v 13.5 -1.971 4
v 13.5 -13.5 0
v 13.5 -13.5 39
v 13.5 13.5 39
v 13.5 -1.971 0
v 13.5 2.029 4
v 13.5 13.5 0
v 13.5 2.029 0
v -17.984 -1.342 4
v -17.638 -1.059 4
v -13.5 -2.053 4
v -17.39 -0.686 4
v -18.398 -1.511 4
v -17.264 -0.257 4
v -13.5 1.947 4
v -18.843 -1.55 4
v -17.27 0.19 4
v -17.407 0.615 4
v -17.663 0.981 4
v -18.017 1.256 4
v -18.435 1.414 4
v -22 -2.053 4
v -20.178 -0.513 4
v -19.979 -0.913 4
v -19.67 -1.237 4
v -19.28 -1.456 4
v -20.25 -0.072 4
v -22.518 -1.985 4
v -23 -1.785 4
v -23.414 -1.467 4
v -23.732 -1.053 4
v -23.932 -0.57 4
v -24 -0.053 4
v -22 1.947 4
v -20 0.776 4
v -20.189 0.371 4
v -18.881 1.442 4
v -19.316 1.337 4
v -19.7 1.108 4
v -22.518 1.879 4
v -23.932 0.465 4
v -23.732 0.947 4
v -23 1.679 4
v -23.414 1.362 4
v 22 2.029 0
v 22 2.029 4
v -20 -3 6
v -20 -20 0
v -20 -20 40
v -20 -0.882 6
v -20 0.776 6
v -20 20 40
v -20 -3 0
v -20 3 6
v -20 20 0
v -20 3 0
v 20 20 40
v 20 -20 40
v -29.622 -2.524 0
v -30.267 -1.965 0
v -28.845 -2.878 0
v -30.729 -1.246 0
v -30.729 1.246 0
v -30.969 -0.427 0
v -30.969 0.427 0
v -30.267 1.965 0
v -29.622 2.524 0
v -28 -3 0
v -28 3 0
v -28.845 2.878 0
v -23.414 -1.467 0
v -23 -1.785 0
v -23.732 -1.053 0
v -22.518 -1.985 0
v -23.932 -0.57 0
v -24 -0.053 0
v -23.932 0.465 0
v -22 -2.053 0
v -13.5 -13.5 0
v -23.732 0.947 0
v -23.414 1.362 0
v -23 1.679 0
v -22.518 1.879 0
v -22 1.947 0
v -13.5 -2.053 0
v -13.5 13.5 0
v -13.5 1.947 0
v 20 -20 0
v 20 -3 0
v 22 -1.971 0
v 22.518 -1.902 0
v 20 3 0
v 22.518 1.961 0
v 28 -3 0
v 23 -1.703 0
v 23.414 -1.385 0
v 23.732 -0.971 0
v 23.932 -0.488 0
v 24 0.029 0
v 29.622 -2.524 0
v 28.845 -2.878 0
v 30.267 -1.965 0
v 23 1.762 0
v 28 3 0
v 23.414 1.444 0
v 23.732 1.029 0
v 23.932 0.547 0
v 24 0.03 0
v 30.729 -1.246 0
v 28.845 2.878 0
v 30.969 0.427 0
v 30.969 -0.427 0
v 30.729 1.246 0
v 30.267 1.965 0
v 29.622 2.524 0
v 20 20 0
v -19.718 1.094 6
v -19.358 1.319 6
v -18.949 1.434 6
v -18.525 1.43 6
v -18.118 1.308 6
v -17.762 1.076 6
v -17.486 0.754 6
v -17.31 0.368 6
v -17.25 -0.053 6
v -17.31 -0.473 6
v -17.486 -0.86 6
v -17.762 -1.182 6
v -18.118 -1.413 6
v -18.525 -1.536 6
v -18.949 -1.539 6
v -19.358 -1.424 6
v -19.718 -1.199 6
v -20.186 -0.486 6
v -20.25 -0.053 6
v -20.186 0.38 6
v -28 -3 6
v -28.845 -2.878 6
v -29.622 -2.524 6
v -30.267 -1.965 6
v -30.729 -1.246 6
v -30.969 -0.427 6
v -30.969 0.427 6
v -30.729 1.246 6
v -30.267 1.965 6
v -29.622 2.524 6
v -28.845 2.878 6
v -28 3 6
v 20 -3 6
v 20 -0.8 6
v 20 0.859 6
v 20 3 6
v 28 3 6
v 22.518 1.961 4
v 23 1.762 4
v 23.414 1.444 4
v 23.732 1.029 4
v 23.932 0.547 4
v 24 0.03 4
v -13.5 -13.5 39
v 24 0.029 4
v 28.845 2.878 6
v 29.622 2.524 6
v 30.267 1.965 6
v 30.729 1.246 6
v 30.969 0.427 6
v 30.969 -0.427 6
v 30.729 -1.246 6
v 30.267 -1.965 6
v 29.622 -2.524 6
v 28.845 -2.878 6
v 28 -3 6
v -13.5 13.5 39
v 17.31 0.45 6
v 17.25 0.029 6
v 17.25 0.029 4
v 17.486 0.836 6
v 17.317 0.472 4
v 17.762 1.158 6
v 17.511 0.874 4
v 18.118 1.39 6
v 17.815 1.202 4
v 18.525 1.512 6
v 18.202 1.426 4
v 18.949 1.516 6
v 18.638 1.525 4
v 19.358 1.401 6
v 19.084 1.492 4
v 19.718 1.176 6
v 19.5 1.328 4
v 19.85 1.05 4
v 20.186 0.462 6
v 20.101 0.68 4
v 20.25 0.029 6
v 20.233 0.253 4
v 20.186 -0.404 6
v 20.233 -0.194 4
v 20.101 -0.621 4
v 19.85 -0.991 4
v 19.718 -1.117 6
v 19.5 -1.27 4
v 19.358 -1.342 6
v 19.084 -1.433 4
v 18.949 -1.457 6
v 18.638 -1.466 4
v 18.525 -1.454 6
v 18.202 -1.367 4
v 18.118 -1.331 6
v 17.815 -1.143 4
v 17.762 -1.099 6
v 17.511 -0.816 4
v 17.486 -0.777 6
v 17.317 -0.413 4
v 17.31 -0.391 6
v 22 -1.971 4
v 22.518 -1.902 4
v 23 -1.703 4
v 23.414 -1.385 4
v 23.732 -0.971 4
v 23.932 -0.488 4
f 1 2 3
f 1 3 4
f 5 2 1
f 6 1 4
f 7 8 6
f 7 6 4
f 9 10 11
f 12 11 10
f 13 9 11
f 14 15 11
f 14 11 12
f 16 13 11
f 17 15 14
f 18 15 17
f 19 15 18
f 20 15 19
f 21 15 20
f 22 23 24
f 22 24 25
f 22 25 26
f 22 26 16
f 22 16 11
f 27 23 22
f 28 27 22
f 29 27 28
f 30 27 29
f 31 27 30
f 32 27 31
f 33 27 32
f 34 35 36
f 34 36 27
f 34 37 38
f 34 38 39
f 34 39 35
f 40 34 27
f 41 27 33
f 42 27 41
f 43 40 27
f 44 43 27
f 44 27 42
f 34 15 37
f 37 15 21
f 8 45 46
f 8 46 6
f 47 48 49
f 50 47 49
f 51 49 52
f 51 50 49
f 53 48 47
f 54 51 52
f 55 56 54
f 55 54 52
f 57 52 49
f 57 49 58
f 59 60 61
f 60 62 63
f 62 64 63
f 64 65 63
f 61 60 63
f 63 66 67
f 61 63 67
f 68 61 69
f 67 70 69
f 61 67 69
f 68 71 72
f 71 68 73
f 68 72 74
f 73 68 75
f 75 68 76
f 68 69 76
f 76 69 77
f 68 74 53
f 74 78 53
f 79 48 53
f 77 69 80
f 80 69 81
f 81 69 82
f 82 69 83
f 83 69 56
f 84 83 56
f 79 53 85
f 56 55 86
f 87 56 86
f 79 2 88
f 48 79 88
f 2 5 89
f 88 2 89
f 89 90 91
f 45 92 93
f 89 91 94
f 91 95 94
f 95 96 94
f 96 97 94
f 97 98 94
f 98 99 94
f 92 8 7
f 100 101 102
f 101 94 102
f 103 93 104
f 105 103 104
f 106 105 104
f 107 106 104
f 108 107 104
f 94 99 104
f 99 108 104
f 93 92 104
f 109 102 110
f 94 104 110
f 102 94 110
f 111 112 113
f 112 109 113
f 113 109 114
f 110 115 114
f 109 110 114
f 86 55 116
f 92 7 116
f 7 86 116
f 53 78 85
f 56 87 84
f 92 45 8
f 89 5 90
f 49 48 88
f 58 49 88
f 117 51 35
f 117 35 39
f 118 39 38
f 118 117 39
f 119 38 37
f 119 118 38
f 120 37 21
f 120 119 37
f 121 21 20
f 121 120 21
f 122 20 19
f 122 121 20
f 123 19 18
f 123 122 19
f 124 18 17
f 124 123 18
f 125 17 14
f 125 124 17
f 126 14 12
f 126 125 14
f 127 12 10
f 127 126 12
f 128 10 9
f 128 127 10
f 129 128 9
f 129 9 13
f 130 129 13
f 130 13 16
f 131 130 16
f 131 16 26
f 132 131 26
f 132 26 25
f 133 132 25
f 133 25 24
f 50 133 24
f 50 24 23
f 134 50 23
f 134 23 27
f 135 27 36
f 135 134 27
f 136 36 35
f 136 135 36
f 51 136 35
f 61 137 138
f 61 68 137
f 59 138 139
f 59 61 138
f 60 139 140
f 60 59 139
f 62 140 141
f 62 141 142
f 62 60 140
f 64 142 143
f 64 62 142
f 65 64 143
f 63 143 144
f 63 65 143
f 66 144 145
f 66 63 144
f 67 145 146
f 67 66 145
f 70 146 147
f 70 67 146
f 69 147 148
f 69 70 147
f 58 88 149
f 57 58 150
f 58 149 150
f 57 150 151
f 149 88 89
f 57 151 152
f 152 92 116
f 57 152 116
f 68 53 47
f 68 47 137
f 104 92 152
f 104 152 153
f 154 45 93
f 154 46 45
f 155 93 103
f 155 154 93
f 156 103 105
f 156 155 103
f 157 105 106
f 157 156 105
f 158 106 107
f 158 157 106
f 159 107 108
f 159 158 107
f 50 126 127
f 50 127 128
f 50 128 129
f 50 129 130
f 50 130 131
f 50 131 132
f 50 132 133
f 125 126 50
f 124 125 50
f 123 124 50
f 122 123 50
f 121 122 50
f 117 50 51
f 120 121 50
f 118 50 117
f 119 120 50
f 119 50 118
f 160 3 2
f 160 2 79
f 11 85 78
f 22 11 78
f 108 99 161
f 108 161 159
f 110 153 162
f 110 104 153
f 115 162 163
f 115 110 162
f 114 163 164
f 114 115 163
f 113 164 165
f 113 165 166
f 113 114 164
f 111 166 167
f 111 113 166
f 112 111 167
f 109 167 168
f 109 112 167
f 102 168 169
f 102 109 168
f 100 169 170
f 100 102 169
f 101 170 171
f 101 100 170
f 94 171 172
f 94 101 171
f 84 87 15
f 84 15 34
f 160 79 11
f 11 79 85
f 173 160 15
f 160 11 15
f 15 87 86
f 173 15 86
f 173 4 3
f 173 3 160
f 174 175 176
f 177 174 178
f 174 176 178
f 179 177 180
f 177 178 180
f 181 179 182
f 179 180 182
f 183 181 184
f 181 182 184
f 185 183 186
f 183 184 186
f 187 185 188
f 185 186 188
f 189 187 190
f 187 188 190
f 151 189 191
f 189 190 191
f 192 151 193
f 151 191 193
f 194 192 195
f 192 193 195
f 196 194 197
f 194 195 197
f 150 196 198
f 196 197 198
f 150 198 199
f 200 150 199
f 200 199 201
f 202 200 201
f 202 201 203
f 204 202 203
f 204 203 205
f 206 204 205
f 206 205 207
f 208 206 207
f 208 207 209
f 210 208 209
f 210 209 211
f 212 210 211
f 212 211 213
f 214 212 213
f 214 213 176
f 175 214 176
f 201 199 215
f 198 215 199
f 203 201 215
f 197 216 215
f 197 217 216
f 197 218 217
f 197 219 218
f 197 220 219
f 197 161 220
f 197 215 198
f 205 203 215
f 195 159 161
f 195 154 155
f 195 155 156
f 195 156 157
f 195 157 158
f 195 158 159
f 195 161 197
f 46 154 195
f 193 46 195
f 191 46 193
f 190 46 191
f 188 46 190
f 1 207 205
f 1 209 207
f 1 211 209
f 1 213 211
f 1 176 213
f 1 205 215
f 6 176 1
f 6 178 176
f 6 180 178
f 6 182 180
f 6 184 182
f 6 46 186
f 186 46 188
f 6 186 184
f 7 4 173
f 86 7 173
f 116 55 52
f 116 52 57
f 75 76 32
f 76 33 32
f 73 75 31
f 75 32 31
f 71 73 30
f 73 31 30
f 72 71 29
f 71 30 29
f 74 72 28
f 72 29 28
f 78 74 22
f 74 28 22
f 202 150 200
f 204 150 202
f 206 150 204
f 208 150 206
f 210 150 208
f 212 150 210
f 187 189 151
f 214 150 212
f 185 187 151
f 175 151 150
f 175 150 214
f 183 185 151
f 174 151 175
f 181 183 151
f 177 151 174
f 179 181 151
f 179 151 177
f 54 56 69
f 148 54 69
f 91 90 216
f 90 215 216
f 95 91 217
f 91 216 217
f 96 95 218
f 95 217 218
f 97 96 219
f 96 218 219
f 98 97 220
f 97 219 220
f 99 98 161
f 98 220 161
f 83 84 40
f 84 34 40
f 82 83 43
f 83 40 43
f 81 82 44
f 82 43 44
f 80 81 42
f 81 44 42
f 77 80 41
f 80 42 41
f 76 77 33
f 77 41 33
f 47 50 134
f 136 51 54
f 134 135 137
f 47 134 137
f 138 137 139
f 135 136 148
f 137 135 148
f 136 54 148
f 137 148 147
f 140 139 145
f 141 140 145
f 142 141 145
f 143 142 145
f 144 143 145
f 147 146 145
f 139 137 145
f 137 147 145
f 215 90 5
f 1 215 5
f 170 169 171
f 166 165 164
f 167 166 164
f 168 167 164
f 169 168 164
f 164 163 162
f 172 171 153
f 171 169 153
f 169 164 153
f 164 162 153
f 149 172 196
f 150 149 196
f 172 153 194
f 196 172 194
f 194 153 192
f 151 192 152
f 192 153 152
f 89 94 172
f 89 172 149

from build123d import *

# Parameters (mm, degrees)
SKETCH1_W               = 40
SKETCH1_H               = 40
BOSS_EXTRUDE1_DEPTH     = 40
SKETCH2_W               = 27
SKETCH2_H               = 27
CUT_EXTRUDE1_DEPTH      = 39
SKETCH3_W               = 11
SKETCH3_H               = 6
BOSS_EXTRUDE3_DEPTH     = 6
SKETCH6_W               = 10.5
SKETCH6_H               = 4
CUT_EXTRUDE2_DEPTH      = 4
SKETCH7_W               = 10.5
SKETCH7_H               = 4
CUT_EXTRUDE3_DEPTH      = 4
SKETCH9_R               = 1.5
CUT_EXTRUDE4_DEPTH      = 2
CUT_EXTRUDE5_DEPTH      = 1
CUT_EXTRUDE5_DEPTH_BACK = 2
SKETCH10_R              = 1.5
FILLET3_RADIUS          = 3
FILLET3_LENGTH          = 6
FILLET4_R               = 2
FILLET6_RADIUS          = 3
FILLET6_LENGTH          = 6
FILLET7_R               = 2


with BuildPart() as part:
    # Sketch1 → Boss-Extrude1 (new body)
    with BuildSketch(Plane.XY):
        Rectangle(SKETCH1_W, SKETCH1_H)
    extrude(amount=BOSS_EXTRUDE1_DEPTH)

    # Sketch2 → Cut-Extrude1 (cut)
    with BuildSketch(Plane(origin=(0, 0, 0), x_dir=(-1, 0, 0), z_dir=(0, 0, -1))):
        Rectangle(SKETCH2_W, SKETCH2_H)
    extrude(amount=-CUT_EXTRUDE1_DEPTH, mode=Mode.SUBTRACT)

    # Sketch3 → Boss-Extrude3 (add)
    with BuildSketch(Plane(origin=(0, 0, 0), x_dir=(-1, 0, 0), z_dir=(0, 0, -1))):
        Polygon((-20, 0), (-20, 3), (-31, 3), (-31, 0), (-31, -3), (-20, -3), align=None)
        with Locations((25.5, 0)):
            Rectangle(SKETCH3_W, SKETCH3_H)
    extrude(amount=-BOSS_EXTRUDE3_DEPTH)

    # Sketch6 → Cut-Extrude2 (cut)
    with BuildSketch(Plane(origin=(0, 0, 0), x_dir=(-1, 0, 0), z_dir=(0, 0, -1))):
        with Locations((-18.75, 0.029439605)):
            Rectangle(SKETCH6_W, SKETCH6_H)
    extrude(amount=-CUT_EXTRUDE2_DEPTH, mode=Mode.SUBTRACT)

    # Sketch7 → Cut-Extrude3 (cut)
    with BuildSketch(Plane(origin=(0, 0, 0), x_dir=(-1, 0, 0), z_dir=(0, 0, -1))):
        with Locations((18.75, -0.052667078)):
            Rectangle(SKETCH7_W, SKETCH7_H)
    extrude(amount=-CUT_EXTRUDE3_DEPTH, mode=Mode.SUBTRACT)

    # Sketch9 → Cut-Extrude4 (cut)
    with BuildSketch(Plane(origin=(0, 0, 4), x_dir=(-1, 0, 0), z_dir=(0, 0, -1))):
        with Locations((-18.75, 0.029439605)):
            Circle(SKETCH9_R)
    extrude(amount=-CUT_EXTRUDE4_DEPTH, mode=Mode.SUBTRACT)

    # Sketch10 → Cut-Extrude5 (cut, two sides: drawn at the far end of the back side and taken through both)
    with BuildSketch(Plane(origin=(0, 0, 4), x_dir=(-1, 0, 0), z_dir=(0, 0, -1)).offset(-CUT_EXTRUDE5_DEPTH_BACK)):
        with Locations(Location((18.75, -0.052667078, 0), (0, 0, 33.557309762))):
            Circle(SKETCH10_R)
    extrude(amount=CUT_EXTRUDE5_DEPTH + CUT_EXTRUDE5_DEPTH_BACK, mode=Mode.SUBTRACT)

    # Fillet3: full round fillet: the end face becomes a half cylinder, R = half its width
    fillet3_face = Plane((31, 0, 3), x_dir=(0, 0, -1), z_dir=(1, 0, 0))  # on the end face: x along it, z out of the body
    fillet3_slab = fillet3_face.offset(-FILLET3_RADIUS / 2) * Box(FILLET3_LENGTH, 2 * FILLET3_RADIUS, FILLET3_RADIUS, mode=Mode.PRIVATE)  # the body's end, R deep
    fillet3_round = Plane((28, 0, 3), x_dir=(1, 0, 0), z_dir=(0, 0, -1)) * Cylinder(FILLET3_RADIUS, FILLET3_LENGTH, mode=Mode.PRIVATE)  # its axis R under the face
    add(fillet3_slab - fillet3_round, mode=Mode.SUBTRACT)

    # Fillet4
    fillet4_edges = [part.edges().sort_by_distance(p)[0] for p in [
        (24, -1.970560395, 2),
        (24, 2.029439605, 2),
    ]]
    fillet(fillet4_edges, radius=FILLET4_R - 0.0001)  # a hair under: the kernel refuses the full size

    # Fillet6: full round fillet: the end face becomes a half cylinder, R = half its width
    fillet6_face = Plane((-31, 0, 3), x_dir=(0, 0, -1), z_dir=(-1, 0, 0))  # on the end face: x along it, z out of the body
    fillet6_slab = fillet6_face.offset(-FILLET6_RADIUS / 2) * Box(FILLET6_LENGTH, 2 * FILLET6_RADIUS, FILLET6_RADIUS, mode=Mode.PRIVATE)  # the body's end, R deep
    fillet6_round = Plane((-28, 0, 3), x_dir=(-1, 0, 0), z_dir=(0, 0, -1)) * Cylinder(FILLET6_RADIUS, FILLET6_LENGTH, mode=Mode.PRIVATE)  # its axis R under the face
    add(fillet6_slab - fillet6_round, mode=Mode.SUBTRACT)

    # Fillet7
    fillet7_edges = [part.edges().sort_by_distance(p)[0] for p in [
        (-24, 1.947332922, 2),
        (-24, -2.052667078, 2),
    ]]
    fillet(fillet7_edges, radius=FILLET7_R - 0.0001)  # a hair under: the kernel refuses the full size


solid = part.part
